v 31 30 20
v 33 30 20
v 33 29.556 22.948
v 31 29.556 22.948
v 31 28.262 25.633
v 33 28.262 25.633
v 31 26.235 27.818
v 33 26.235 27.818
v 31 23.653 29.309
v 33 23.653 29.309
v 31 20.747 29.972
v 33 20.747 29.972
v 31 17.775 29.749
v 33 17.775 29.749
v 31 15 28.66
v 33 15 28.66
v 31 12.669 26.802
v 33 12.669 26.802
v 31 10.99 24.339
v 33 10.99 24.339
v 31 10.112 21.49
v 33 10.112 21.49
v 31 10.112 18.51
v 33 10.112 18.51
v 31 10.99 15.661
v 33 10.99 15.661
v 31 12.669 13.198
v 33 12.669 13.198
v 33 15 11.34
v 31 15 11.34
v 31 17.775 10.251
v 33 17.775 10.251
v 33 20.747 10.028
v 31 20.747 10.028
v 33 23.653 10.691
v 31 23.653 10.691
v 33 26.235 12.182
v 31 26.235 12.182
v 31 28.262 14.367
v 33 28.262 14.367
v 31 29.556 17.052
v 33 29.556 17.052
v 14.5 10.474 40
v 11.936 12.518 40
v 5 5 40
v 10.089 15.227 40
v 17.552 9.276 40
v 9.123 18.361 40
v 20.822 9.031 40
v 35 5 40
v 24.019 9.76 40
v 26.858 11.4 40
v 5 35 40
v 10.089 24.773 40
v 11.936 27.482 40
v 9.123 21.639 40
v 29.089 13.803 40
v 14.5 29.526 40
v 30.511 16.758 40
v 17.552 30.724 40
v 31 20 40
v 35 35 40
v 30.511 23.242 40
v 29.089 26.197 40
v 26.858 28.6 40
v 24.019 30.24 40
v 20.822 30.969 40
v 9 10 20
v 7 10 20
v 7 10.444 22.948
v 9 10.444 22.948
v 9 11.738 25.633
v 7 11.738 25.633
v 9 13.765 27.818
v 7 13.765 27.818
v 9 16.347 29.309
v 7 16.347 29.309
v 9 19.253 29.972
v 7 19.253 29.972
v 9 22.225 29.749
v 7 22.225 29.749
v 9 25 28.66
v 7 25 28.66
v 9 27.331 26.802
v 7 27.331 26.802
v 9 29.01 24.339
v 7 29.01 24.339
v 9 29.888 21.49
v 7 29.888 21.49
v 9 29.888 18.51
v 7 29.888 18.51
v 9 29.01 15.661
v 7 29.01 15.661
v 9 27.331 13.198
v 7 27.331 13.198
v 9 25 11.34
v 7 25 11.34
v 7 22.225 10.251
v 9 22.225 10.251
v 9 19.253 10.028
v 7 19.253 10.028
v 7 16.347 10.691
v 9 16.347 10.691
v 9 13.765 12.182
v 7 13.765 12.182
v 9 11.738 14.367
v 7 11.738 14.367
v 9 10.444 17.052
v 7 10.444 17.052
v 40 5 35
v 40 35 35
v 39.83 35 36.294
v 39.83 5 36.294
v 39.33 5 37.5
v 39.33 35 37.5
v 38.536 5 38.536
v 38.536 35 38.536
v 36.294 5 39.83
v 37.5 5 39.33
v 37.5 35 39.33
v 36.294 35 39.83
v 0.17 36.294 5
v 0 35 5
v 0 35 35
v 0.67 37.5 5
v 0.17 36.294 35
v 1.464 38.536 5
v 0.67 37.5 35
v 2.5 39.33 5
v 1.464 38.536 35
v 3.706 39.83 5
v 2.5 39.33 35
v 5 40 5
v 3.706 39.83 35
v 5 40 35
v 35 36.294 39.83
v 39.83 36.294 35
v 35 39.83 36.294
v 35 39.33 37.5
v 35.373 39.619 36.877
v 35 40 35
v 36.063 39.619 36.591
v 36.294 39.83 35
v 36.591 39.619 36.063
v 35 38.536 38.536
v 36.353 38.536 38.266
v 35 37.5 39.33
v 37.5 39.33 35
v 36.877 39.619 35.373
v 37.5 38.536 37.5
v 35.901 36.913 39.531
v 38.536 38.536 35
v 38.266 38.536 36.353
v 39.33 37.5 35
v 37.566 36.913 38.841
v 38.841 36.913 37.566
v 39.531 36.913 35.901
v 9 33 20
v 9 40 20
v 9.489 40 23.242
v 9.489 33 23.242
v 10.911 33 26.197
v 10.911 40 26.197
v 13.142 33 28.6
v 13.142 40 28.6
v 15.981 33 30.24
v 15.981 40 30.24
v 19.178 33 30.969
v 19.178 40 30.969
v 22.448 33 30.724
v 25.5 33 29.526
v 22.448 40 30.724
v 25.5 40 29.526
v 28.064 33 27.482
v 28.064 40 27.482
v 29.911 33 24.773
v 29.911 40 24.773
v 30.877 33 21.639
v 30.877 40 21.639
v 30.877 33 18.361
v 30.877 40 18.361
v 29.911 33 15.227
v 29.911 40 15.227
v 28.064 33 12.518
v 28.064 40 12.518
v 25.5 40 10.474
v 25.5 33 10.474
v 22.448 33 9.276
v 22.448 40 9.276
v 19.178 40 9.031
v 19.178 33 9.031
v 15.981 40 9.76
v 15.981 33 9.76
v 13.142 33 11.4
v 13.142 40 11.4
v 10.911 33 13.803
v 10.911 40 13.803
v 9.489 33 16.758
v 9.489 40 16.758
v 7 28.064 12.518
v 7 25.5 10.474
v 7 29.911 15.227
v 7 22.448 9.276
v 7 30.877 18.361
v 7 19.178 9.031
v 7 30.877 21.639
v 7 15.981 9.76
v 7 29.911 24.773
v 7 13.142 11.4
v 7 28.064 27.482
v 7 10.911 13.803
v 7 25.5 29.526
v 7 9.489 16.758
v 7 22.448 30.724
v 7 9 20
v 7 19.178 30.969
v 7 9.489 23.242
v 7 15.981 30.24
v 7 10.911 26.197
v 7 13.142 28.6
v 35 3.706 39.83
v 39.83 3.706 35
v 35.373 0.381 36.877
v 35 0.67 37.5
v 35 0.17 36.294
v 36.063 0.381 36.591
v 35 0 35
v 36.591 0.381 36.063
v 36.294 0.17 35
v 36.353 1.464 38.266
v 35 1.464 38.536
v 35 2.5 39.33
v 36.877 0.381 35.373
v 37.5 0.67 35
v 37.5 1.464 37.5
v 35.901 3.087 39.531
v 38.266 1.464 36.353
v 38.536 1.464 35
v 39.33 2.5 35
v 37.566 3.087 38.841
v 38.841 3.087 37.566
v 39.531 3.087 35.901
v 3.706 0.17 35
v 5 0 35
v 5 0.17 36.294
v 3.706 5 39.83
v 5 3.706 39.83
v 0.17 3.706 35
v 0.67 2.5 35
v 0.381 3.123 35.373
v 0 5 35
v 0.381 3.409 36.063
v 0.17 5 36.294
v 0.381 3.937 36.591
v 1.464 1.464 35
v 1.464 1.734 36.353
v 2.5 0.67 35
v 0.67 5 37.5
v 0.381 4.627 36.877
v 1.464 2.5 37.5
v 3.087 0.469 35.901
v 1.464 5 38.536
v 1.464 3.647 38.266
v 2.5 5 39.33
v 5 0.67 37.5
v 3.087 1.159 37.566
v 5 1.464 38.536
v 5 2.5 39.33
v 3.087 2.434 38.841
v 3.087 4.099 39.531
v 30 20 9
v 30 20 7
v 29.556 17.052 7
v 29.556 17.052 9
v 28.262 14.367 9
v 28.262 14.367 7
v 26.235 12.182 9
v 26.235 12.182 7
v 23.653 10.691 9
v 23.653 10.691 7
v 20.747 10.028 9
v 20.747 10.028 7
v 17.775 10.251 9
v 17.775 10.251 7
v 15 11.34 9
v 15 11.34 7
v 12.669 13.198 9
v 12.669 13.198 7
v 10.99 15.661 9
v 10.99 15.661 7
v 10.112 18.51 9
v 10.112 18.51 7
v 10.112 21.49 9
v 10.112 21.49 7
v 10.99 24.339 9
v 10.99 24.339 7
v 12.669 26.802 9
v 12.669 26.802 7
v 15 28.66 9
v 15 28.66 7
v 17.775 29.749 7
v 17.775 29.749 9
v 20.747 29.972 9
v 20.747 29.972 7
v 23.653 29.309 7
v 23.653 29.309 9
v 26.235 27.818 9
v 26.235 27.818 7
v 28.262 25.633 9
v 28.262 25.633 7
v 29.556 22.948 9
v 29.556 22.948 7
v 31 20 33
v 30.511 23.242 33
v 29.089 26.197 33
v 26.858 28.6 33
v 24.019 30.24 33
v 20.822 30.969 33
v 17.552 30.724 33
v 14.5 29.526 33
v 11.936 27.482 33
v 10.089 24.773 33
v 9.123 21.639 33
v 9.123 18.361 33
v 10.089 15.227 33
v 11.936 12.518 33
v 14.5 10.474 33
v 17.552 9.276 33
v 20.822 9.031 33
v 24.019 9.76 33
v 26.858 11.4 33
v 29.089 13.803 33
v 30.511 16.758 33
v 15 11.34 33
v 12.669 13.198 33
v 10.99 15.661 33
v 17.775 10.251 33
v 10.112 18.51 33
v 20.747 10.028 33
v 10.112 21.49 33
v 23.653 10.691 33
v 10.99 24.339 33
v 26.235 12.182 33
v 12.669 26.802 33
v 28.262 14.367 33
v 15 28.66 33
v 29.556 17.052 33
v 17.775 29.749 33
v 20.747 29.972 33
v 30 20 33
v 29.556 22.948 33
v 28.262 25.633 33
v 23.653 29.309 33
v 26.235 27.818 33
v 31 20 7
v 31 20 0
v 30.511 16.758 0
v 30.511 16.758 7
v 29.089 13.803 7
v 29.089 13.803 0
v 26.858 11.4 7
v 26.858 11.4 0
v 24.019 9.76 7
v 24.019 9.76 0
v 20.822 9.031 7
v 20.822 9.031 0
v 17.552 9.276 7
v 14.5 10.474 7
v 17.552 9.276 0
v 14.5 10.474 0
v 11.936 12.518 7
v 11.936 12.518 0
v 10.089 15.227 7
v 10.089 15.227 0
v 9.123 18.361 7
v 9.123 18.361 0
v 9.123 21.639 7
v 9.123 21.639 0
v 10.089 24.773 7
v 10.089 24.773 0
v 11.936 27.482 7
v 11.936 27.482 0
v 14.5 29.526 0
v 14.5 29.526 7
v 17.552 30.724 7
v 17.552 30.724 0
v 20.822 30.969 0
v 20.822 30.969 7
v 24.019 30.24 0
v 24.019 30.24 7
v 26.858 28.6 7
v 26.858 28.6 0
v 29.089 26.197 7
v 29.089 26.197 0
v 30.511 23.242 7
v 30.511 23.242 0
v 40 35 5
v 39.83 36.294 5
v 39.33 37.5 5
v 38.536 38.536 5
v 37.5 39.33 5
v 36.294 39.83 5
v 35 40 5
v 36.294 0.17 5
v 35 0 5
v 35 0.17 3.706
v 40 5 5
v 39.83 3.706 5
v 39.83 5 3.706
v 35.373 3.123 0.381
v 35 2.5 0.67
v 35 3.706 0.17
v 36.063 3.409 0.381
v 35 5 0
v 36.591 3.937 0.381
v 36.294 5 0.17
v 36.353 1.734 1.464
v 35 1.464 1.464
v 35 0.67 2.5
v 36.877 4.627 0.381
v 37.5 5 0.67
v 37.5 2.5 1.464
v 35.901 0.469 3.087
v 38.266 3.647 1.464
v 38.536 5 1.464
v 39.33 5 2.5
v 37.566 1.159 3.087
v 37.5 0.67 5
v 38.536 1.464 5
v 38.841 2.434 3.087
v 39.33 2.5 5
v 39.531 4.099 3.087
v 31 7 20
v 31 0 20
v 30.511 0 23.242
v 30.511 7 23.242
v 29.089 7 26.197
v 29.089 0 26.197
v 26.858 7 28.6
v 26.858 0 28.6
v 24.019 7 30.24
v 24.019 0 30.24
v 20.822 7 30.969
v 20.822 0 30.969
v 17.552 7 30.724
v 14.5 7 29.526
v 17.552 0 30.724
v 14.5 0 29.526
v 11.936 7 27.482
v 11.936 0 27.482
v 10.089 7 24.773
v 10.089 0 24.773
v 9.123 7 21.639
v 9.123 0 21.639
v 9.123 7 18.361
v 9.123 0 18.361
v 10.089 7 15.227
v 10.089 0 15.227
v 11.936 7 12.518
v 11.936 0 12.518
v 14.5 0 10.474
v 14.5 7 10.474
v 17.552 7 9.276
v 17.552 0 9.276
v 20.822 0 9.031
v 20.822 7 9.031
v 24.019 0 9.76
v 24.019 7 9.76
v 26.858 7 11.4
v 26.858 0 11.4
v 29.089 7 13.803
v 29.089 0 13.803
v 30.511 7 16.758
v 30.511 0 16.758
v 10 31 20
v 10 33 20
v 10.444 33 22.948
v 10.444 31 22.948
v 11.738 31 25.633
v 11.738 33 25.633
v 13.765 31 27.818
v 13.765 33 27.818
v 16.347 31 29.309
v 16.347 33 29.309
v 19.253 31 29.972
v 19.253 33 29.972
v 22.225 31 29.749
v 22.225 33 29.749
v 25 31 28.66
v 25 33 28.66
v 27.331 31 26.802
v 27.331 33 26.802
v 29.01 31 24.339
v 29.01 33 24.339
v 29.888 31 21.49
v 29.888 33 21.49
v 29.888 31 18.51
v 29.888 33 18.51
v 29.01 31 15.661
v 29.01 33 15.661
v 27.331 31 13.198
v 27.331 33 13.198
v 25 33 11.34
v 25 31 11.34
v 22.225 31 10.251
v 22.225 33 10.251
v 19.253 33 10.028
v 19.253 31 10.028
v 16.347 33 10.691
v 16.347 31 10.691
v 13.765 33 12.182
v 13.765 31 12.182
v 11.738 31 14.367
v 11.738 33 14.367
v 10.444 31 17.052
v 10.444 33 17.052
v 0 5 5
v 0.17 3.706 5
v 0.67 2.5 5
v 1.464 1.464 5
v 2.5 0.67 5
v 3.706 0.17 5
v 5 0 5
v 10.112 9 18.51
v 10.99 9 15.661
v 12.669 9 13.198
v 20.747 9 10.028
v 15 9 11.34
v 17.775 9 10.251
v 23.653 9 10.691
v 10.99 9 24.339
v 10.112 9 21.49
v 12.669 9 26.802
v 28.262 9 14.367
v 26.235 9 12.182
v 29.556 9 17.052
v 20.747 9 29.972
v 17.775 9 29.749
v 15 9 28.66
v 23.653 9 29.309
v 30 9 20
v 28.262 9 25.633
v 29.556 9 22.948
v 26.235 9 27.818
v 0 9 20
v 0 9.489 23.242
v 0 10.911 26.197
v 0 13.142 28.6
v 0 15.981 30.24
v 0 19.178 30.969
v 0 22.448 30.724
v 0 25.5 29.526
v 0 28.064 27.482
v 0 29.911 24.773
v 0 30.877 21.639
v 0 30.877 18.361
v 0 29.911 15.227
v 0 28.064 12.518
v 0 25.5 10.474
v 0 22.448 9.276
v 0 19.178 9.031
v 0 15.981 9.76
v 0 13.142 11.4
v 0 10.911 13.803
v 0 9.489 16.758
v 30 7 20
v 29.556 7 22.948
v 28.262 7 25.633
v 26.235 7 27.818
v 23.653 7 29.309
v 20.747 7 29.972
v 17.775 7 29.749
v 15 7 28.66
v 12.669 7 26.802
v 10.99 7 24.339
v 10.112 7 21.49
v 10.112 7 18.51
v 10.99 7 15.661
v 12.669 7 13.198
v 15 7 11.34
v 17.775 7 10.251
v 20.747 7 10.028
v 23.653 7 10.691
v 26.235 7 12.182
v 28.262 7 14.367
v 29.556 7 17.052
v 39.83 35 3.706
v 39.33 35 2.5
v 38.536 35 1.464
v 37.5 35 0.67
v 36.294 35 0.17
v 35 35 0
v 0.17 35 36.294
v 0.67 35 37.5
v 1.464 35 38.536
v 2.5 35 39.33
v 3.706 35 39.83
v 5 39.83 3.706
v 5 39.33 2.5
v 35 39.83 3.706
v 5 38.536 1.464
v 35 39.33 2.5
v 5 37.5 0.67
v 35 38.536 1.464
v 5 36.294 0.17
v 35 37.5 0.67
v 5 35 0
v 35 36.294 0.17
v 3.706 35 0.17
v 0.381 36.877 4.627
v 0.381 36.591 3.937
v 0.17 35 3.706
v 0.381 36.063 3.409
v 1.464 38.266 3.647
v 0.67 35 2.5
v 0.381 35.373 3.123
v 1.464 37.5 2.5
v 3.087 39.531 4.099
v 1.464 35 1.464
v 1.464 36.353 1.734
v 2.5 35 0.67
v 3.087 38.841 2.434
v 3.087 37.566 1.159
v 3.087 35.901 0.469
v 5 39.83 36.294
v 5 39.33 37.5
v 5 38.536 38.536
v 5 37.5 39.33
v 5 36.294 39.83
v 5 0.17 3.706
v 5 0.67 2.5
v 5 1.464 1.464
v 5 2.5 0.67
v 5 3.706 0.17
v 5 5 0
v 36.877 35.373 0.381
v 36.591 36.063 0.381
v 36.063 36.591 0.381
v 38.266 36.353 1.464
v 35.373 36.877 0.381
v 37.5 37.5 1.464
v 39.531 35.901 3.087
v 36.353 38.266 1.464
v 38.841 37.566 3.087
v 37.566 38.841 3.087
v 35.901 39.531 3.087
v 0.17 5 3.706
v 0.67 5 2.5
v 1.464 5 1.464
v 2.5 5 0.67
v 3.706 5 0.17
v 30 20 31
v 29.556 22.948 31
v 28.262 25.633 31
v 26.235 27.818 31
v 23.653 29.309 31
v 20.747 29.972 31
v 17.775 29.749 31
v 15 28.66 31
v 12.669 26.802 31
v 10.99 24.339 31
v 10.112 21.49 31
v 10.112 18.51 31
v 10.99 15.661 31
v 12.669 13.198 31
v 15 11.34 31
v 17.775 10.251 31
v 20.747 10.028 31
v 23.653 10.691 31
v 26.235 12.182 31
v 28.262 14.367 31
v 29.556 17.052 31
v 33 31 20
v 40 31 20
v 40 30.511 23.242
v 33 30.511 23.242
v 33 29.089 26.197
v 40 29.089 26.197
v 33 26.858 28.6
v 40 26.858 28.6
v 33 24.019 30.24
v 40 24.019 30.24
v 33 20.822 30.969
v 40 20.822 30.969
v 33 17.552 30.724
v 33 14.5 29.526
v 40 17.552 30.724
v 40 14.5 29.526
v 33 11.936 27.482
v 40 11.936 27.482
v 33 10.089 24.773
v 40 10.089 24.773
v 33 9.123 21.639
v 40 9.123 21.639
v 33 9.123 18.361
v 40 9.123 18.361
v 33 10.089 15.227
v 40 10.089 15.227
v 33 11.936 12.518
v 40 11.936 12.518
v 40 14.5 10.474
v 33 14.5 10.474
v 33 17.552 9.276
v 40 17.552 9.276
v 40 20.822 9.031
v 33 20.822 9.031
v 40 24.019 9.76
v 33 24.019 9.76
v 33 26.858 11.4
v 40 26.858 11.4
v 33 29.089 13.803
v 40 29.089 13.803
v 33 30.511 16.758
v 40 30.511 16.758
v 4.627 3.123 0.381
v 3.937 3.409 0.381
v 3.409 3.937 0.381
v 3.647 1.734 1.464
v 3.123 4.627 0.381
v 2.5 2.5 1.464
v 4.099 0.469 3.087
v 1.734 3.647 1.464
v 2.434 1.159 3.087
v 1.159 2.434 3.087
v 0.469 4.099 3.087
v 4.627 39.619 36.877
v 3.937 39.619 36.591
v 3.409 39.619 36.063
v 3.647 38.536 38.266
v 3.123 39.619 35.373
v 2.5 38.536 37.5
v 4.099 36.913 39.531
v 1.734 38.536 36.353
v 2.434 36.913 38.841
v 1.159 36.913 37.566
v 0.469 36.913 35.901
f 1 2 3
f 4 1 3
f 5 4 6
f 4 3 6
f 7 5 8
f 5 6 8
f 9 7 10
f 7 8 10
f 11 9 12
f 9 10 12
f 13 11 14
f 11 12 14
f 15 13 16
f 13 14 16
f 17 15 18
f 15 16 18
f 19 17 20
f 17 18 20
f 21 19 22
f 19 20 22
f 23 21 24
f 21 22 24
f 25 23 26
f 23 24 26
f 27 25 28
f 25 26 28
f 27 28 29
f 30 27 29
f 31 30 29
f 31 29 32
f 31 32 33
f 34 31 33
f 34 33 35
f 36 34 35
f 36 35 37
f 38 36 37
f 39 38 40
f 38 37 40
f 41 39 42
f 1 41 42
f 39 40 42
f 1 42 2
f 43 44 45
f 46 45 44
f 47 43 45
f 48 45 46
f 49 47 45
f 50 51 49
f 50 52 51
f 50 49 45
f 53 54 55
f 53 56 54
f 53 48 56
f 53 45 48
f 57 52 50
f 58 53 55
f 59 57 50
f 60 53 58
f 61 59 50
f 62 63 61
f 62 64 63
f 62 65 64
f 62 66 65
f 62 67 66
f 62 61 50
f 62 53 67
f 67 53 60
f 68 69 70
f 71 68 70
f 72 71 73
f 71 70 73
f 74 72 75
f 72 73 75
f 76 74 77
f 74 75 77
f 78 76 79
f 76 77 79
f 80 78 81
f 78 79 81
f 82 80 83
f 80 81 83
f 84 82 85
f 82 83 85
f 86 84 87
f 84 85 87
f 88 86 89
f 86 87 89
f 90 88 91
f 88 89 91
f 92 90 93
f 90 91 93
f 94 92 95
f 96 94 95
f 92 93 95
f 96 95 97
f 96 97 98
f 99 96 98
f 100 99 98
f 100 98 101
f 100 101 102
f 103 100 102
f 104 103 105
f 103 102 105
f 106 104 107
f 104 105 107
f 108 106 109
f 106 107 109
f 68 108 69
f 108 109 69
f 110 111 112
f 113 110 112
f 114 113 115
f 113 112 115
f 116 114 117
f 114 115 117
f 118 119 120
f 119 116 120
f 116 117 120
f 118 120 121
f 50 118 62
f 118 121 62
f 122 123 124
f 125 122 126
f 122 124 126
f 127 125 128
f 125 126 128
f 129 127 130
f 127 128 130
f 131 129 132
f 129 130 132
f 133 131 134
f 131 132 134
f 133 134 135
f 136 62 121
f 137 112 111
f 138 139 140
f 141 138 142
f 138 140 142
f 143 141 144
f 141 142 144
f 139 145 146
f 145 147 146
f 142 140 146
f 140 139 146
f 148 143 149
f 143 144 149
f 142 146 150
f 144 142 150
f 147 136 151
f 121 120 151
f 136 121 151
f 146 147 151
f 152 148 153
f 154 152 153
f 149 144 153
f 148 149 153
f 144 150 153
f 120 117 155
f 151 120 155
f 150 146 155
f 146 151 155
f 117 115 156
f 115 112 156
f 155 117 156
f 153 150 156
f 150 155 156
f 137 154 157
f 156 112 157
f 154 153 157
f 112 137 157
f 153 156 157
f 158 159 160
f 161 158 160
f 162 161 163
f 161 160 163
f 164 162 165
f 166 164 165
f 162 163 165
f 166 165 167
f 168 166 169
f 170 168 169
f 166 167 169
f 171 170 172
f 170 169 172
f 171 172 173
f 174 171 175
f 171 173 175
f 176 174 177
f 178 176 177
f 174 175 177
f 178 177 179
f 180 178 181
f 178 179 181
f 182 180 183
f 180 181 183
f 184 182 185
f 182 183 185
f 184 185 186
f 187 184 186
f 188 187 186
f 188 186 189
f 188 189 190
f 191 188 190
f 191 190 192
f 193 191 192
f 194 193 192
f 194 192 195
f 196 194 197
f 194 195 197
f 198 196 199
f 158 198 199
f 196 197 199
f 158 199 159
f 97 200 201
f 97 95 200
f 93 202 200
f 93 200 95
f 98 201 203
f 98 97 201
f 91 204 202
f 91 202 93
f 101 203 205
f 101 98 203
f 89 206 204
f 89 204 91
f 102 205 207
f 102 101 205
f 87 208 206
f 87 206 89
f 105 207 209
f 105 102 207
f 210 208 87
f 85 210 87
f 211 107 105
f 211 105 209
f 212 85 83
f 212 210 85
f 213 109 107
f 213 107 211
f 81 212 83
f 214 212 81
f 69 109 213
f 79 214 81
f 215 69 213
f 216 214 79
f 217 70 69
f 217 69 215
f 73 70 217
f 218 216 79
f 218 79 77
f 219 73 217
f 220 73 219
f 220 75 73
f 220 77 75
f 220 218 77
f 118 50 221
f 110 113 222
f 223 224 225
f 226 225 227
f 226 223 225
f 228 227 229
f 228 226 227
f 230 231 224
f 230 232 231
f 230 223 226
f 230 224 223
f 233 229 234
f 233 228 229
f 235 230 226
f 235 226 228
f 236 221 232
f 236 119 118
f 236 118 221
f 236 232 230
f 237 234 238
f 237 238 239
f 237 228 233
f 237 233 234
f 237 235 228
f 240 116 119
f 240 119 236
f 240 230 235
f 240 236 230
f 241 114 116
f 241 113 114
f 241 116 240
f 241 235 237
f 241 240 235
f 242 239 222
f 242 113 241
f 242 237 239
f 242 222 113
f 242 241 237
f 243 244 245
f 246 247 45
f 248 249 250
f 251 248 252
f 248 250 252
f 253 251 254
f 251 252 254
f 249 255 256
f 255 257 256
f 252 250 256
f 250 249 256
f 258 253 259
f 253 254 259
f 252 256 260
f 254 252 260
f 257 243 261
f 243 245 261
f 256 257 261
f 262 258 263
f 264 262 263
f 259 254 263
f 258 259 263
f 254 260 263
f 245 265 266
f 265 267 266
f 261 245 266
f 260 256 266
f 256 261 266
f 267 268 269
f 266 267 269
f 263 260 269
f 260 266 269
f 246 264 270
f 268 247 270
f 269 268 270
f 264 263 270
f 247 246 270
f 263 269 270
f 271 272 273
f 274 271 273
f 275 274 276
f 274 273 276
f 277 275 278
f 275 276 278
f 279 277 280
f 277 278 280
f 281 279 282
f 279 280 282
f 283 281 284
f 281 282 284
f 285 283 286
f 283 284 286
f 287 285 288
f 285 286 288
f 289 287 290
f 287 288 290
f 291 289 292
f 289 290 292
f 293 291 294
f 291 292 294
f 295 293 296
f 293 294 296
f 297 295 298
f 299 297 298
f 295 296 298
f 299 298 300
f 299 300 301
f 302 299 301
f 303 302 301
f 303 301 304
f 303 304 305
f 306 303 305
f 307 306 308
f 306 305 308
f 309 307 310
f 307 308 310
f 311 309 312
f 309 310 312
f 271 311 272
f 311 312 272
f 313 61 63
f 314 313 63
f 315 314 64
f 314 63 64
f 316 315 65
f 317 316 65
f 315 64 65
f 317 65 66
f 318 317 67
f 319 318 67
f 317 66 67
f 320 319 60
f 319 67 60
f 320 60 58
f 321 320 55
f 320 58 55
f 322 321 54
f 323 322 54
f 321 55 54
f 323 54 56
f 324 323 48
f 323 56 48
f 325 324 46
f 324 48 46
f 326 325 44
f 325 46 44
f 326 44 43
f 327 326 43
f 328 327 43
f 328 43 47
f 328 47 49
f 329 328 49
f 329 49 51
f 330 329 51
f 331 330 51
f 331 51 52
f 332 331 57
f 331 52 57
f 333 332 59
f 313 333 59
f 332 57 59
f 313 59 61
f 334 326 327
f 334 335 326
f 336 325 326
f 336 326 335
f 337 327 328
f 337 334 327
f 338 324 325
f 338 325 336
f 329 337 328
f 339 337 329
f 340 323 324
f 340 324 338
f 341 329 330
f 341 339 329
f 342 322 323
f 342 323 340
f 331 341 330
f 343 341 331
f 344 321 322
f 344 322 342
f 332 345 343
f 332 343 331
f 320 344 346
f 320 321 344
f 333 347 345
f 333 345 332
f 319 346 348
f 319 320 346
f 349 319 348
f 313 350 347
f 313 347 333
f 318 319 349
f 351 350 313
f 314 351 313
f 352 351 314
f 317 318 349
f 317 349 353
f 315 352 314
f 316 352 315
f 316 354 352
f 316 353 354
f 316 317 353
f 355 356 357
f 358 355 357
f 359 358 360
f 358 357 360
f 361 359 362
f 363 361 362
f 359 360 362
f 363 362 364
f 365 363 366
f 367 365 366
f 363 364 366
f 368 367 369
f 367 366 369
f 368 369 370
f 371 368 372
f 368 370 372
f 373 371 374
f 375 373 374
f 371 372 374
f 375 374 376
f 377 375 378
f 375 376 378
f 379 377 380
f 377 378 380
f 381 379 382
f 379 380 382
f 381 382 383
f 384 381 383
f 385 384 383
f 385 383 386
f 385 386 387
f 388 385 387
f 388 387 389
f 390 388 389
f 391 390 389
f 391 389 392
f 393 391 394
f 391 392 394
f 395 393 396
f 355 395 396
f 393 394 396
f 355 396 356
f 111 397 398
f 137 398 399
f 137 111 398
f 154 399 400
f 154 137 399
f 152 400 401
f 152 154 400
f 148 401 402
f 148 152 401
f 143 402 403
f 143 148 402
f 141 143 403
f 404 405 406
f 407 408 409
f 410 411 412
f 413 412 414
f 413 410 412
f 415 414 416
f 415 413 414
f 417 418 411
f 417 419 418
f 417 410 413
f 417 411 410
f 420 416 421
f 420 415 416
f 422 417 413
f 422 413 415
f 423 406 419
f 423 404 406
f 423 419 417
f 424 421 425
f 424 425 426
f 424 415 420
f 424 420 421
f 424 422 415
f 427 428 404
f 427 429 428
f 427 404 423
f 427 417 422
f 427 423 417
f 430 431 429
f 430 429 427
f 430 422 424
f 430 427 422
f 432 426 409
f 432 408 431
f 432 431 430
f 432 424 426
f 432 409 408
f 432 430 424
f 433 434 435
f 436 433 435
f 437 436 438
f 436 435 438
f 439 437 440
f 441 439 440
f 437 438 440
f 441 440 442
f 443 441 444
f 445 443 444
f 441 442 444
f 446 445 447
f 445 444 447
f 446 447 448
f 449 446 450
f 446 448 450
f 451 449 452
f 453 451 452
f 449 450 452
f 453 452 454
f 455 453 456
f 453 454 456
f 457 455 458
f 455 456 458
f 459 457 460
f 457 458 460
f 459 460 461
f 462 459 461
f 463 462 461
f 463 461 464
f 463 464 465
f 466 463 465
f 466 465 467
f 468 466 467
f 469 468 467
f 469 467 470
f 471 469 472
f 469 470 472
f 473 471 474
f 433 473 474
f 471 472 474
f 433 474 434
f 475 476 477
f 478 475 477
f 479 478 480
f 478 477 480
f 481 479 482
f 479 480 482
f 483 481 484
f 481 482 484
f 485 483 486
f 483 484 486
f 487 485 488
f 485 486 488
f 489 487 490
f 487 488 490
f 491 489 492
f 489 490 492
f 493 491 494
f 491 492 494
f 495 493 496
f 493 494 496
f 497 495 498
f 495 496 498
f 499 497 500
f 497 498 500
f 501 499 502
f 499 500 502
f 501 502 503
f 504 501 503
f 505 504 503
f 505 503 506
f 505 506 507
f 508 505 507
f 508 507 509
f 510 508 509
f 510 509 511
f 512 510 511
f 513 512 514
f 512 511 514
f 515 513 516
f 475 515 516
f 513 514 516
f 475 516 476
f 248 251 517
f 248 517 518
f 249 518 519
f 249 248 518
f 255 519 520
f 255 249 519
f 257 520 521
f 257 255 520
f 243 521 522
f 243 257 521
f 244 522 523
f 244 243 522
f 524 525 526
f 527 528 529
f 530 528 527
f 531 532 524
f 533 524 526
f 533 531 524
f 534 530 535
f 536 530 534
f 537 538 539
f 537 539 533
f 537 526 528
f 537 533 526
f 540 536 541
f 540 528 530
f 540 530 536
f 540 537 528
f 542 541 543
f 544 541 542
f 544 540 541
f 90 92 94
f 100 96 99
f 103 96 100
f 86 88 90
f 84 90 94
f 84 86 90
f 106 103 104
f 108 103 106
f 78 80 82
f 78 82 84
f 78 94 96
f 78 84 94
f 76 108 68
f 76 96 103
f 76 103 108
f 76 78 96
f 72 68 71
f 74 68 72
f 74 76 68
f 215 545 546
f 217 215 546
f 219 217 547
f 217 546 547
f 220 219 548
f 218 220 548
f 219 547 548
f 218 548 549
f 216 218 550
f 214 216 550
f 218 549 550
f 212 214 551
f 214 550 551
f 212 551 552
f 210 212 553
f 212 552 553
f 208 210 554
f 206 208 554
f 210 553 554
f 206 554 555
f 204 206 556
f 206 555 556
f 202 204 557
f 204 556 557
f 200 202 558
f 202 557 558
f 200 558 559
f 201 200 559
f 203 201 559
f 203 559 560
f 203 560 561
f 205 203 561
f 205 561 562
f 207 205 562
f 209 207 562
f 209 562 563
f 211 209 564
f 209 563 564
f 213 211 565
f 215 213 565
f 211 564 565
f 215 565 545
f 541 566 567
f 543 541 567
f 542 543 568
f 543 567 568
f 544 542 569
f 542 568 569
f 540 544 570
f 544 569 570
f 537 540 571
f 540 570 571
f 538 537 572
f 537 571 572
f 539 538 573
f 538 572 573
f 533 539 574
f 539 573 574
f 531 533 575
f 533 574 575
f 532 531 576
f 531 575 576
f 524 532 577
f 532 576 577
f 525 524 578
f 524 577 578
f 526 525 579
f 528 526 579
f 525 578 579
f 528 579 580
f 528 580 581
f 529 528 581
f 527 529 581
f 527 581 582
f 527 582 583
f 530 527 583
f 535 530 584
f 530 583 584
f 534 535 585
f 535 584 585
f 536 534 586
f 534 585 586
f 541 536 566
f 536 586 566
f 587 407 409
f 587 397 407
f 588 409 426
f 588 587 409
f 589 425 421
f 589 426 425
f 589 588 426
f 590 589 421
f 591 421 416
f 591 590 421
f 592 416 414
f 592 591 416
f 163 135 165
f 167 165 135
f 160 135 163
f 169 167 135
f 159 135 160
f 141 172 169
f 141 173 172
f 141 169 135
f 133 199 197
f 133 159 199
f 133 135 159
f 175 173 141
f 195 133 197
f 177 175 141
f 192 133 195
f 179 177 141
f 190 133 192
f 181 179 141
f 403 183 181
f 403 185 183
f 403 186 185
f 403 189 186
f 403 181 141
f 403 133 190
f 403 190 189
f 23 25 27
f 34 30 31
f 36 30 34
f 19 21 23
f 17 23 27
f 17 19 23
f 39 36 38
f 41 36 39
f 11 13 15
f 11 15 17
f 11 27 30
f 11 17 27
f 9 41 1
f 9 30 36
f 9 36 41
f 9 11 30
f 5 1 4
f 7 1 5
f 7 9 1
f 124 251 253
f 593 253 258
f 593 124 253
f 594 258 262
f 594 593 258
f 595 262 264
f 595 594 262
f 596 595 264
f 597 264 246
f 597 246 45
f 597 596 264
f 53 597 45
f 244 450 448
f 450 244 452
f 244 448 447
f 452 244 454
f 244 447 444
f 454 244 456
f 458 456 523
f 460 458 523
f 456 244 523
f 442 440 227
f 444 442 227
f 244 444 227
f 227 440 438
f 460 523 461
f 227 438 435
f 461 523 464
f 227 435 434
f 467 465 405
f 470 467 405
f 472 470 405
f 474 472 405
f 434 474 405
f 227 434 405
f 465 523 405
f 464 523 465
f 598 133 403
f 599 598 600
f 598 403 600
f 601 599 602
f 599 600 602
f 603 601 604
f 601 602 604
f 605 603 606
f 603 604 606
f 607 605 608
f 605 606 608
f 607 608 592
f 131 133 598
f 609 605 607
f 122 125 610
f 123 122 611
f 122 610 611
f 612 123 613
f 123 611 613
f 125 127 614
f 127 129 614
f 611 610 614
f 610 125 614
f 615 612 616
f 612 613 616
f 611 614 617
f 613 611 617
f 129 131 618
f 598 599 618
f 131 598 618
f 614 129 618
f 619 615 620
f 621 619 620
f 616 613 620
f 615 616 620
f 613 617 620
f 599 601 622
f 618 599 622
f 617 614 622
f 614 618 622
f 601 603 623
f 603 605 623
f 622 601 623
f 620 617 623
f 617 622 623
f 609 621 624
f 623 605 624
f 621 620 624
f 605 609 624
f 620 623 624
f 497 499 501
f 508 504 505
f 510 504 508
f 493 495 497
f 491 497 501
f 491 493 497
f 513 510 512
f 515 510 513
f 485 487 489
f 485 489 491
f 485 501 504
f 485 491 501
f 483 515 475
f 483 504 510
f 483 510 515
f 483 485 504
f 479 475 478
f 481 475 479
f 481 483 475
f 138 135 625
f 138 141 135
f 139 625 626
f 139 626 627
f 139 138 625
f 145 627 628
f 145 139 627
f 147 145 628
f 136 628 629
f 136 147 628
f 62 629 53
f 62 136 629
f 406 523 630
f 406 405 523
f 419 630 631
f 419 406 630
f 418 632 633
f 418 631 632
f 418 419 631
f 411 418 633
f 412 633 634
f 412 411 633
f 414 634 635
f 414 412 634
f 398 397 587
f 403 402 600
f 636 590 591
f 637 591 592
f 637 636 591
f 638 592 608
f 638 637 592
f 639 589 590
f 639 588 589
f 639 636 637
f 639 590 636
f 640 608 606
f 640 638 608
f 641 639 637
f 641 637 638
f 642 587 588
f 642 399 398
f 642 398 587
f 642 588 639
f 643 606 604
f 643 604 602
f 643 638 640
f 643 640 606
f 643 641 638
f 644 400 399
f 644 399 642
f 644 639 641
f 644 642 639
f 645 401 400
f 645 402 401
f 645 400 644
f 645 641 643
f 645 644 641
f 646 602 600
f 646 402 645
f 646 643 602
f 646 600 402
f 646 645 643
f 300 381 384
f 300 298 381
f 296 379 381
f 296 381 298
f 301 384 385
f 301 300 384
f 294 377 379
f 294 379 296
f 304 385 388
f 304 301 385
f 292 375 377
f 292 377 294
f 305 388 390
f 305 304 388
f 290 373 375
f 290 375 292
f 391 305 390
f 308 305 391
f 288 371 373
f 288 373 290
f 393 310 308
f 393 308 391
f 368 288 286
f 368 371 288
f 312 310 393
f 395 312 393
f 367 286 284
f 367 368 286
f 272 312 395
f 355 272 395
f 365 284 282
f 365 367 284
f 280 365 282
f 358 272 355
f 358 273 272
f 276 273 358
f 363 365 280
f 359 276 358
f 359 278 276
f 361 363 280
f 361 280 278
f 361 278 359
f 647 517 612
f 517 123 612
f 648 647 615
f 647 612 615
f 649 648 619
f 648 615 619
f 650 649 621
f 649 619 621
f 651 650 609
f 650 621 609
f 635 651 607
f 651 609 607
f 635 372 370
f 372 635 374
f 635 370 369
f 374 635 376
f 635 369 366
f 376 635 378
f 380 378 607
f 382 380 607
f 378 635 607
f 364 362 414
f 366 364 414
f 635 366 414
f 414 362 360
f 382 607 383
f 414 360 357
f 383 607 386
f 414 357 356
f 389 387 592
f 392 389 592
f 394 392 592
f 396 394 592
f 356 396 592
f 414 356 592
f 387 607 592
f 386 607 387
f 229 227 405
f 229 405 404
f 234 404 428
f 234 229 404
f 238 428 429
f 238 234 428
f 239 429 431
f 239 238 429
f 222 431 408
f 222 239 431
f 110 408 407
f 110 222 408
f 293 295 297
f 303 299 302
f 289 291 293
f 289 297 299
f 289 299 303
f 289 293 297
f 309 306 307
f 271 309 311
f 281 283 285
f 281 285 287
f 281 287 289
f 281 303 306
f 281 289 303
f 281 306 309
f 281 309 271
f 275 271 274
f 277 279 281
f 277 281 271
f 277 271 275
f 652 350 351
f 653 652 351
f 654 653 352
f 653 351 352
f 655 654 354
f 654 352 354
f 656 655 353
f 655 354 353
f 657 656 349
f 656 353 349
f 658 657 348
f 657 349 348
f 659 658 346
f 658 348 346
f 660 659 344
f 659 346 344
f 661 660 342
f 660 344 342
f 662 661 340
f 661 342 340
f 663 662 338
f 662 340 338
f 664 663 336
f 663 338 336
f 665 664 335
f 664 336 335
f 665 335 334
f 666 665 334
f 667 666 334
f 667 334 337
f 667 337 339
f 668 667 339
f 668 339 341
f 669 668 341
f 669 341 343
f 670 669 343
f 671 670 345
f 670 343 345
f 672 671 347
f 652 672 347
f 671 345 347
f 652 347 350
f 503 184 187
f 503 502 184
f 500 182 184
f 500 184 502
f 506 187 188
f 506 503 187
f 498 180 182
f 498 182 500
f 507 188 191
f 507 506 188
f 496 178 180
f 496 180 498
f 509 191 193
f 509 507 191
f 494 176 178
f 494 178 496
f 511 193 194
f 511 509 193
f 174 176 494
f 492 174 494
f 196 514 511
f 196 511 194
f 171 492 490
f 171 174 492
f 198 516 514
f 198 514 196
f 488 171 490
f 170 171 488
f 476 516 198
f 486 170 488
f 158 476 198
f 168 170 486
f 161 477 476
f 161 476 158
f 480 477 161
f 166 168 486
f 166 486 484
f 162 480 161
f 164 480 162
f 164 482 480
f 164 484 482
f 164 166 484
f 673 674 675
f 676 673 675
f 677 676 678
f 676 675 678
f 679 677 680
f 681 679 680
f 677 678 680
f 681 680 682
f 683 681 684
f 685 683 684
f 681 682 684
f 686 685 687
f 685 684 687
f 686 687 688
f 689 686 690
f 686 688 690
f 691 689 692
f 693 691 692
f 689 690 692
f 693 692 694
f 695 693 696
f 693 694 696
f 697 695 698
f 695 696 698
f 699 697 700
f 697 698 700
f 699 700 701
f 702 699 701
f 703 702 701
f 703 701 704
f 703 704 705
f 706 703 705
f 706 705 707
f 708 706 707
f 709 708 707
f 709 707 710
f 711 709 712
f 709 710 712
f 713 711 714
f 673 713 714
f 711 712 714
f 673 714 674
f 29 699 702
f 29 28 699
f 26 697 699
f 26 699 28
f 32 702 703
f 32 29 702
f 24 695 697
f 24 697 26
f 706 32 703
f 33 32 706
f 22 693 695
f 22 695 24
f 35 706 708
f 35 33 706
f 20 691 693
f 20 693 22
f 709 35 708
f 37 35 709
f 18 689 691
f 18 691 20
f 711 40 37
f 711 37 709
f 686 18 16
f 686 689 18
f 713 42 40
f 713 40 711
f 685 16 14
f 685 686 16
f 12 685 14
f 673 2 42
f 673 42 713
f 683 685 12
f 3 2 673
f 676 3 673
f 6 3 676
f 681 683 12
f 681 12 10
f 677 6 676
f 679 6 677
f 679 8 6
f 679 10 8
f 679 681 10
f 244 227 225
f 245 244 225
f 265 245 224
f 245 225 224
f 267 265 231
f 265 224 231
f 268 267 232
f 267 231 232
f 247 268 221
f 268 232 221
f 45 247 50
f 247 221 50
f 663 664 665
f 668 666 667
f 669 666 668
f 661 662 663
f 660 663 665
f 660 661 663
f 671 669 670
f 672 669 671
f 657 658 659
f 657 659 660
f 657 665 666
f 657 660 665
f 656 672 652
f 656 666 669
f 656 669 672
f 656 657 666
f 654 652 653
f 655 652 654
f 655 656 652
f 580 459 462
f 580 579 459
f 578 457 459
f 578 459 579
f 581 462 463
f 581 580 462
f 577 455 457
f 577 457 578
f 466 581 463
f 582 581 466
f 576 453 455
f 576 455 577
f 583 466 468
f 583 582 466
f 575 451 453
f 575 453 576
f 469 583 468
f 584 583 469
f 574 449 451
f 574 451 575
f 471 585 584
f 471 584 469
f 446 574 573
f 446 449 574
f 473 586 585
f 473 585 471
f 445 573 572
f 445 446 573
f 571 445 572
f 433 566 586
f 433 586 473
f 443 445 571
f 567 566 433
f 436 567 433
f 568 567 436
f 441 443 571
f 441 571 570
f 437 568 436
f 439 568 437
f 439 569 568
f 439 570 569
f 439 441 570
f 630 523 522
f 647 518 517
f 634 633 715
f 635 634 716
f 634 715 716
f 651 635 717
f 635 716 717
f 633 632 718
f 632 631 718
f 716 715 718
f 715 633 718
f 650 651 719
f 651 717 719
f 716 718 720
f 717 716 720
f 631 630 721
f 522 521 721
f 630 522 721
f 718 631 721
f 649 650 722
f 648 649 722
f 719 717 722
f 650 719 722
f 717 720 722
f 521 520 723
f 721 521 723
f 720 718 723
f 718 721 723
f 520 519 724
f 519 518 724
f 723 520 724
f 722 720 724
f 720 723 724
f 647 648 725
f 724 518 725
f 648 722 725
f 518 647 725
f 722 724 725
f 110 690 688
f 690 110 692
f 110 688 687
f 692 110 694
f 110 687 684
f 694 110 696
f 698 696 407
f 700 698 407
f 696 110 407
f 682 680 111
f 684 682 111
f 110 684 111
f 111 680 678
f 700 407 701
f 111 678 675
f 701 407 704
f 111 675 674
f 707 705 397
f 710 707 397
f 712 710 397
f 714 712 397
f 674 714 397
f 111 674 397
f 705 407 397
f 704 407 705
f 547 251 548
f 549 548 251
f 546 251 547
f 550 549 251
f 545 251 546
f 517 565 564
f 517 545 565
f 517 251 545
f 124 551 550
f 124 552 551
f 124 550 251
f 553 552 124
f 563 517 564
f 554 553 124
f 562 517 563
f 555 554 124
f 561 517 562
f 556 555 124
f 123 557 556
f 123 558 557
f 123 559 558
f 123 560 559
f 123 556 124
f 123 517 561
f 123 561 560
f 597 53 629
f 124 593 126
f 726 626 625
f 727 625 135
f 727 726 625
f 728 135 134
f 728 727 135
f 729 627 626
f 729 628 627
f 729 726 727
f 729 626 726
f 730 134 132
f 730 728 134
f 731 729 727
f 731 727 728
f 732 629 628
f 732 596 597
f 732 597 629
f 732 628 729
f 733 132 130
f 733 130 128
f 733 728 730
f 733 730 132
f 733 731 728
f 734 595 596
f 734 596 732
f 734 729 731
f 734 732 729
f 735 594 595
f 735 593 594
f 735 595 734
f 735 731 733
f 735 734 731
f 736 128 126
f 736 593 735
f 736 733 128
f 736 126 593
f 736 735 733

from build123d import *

# Parameters (mm, degrees)
F0_W      = 40
F0_H      = 40
F1_DEPTH  = 40
F2_R      = 5
F3_R      = 11
F4_DEPTH  = 7
F5_R      = 11
F6_DEPTH  = 7
F7_R      = 11
F8_DEPTH  = 7
F9_R      = 11
F10_DEPTH = 7
F11_R     = 11
F12_DEPTH = 7
F13_R     = 11
F14_DEPTH = 7
F15_R     = 10
F16_DEPTH = 2
F17_R     = 10
F18_DEPTH = 2
F19_R     = 10
F20_DEPTH = 2
F21_R     = 10
F22_DEPTH = 2
F23_R     = 10
F24_DEPTH = 2
F25_R     = 10
F26_DEPTH = 2


with BuildPart() as f1:
    # F0 (on Top) → F1 (new body)
    with BuildSketch(Plane.XY):
        with Locations((20, 20)):
            Rectangle(F0_W, F0_H)
    extrude(amount=F1_DEPTH)

    # F2
    f2_edges = [f1.edges().sort_by_distance(p)[0] for p in [
        (40, 20, 40),
        (20, 0, 40),
        (0, 0, 20),
        (40, 0, 20),
        (20, 0, 0),
        (0, 20, 40),
        (20, 40, 40),
        (40, 40, 20),
        (40, 20, 0),
        (20, 40, 0),
        (0, 40, 20),
        (0, 20, 0),
    ]]
    fillet(f2_edges, radius=F2_R)

    # F3 (on face) → F4 (cut)
    with BuildSketch(Plane.XZ):
        with Locations((20, 20)):
            Circle(F3_R)
    extrude(amount=-F4_DEPTH, mode=Mode.SUBTRACT)

    # F5 (on face) → F6 (cut)
    with BuildSketch(Plane(origin=(0, 40, 0), x_dir=(-1, 0, 0), z_dir=(0, 1, 0))):
        with Locations((-20, 20)):
            Circle(F5_R)
    extrude(amount=-F6_DEPTH, mode=Mode.SUBTRACT)

    # F7 (on face) → F8 (cut)
    with BuildSketch(Plane(origin=(0, 0, 0), x_dir=(0, -1, 0), z_dir=(-1, 0, 0))):
        with Locations((-20, 20)):
            Circle(F7_R)
    extrude(amount=-F8_DEPTH, mode=Mode.SUBTRACT)

    # F9 (on face) → F10 (cut)
    with BuildSketch(Plane.YZ.offset(40)):
        with Locations((20, 20)):
            Circle(F9_R)
    extrude(amount=-F10_DEPTH, mode=Mode.SUBTRACT)

    # F11 (on face) → F12 (cut)
    with BuildSketch(Plane(origin=(0, 0, 0), x_dir=(1, 0, 0), z_dir=(0, 0, -1))):
        with Locations((20, -20)):
            Circle(F11_R)
    extrude(amount=-F12_DEPTH, mode=Mode.SUBTRACT)

    # F13 (on face) → F14 (cut)
    with BuildSketch(Plane.XY.offset(40)):
        with Locations((20, 20)):
            Circle(F13_R)
    extrude(amount=-F14_DEPTH, mode=Mode.SUBTRACT)

    # F15 (on face) → F16 (cut)
    with BuildSketch(Plane.XY.offset(33)):
        with Locations((20, 20)):
            Circle(F15_R)
    extrude(amount=-F16_DEPTH, mode=Mode.SUBTRACT)

    # F17 (on face) → F18 (cut)
    with BuildSketch(Plane.XZ.offset(-7)):
        with Locations((20, 20)):
            Circle(F17_R)
    extrude(amount=-F18_DEPTH, mode=Mode.SUBTRACT)

    # F19 (on face) → F20 (cut)
    with BuildSketch(Plane(origin=(0, 0, 7), x_dir=(1, 0, 0), z_dir=(0, 0, -1))):
        with Locations((20, -20)):
            Circle(F19_R)
    extrude(amount=-F20_DEPTH, mode=Mode.SUBTRACT)

    # F21 (on face) → F22 (cut)
    with BuildSketch(Plane(origin=(7, 0, 0), x_dir=(0, -1, 0), z_dir=(-1, 0, 0))):
        with Locations((-20, 20)):
            Circle(F21_R)
    extrude(amount=-F22_DEPTH, mode=Mode.SUBTRACT)

    # F23 (on face) → F24 (cut)
    with BuildSketch(Plane(origin=(0, 33, 0), x_dir=(-1, 0, 0), z_dir=(0, 1, 0))):
        with Locations((-20, 20)):
            Circle(F23_R)
    extrude(amount=-F24_DEPTH, mode=Mode.SUBTRACT)

    # F25 (on face) → F26 (cut)
    with BuildSketch(Plane.YZ.offset(33)):
        with Locations((20, 20)):
            Circle(F25_R)
    extrude(amount=-F26_DEPTH, mode=Mode.SUBTRACT)


solid = f1.part
